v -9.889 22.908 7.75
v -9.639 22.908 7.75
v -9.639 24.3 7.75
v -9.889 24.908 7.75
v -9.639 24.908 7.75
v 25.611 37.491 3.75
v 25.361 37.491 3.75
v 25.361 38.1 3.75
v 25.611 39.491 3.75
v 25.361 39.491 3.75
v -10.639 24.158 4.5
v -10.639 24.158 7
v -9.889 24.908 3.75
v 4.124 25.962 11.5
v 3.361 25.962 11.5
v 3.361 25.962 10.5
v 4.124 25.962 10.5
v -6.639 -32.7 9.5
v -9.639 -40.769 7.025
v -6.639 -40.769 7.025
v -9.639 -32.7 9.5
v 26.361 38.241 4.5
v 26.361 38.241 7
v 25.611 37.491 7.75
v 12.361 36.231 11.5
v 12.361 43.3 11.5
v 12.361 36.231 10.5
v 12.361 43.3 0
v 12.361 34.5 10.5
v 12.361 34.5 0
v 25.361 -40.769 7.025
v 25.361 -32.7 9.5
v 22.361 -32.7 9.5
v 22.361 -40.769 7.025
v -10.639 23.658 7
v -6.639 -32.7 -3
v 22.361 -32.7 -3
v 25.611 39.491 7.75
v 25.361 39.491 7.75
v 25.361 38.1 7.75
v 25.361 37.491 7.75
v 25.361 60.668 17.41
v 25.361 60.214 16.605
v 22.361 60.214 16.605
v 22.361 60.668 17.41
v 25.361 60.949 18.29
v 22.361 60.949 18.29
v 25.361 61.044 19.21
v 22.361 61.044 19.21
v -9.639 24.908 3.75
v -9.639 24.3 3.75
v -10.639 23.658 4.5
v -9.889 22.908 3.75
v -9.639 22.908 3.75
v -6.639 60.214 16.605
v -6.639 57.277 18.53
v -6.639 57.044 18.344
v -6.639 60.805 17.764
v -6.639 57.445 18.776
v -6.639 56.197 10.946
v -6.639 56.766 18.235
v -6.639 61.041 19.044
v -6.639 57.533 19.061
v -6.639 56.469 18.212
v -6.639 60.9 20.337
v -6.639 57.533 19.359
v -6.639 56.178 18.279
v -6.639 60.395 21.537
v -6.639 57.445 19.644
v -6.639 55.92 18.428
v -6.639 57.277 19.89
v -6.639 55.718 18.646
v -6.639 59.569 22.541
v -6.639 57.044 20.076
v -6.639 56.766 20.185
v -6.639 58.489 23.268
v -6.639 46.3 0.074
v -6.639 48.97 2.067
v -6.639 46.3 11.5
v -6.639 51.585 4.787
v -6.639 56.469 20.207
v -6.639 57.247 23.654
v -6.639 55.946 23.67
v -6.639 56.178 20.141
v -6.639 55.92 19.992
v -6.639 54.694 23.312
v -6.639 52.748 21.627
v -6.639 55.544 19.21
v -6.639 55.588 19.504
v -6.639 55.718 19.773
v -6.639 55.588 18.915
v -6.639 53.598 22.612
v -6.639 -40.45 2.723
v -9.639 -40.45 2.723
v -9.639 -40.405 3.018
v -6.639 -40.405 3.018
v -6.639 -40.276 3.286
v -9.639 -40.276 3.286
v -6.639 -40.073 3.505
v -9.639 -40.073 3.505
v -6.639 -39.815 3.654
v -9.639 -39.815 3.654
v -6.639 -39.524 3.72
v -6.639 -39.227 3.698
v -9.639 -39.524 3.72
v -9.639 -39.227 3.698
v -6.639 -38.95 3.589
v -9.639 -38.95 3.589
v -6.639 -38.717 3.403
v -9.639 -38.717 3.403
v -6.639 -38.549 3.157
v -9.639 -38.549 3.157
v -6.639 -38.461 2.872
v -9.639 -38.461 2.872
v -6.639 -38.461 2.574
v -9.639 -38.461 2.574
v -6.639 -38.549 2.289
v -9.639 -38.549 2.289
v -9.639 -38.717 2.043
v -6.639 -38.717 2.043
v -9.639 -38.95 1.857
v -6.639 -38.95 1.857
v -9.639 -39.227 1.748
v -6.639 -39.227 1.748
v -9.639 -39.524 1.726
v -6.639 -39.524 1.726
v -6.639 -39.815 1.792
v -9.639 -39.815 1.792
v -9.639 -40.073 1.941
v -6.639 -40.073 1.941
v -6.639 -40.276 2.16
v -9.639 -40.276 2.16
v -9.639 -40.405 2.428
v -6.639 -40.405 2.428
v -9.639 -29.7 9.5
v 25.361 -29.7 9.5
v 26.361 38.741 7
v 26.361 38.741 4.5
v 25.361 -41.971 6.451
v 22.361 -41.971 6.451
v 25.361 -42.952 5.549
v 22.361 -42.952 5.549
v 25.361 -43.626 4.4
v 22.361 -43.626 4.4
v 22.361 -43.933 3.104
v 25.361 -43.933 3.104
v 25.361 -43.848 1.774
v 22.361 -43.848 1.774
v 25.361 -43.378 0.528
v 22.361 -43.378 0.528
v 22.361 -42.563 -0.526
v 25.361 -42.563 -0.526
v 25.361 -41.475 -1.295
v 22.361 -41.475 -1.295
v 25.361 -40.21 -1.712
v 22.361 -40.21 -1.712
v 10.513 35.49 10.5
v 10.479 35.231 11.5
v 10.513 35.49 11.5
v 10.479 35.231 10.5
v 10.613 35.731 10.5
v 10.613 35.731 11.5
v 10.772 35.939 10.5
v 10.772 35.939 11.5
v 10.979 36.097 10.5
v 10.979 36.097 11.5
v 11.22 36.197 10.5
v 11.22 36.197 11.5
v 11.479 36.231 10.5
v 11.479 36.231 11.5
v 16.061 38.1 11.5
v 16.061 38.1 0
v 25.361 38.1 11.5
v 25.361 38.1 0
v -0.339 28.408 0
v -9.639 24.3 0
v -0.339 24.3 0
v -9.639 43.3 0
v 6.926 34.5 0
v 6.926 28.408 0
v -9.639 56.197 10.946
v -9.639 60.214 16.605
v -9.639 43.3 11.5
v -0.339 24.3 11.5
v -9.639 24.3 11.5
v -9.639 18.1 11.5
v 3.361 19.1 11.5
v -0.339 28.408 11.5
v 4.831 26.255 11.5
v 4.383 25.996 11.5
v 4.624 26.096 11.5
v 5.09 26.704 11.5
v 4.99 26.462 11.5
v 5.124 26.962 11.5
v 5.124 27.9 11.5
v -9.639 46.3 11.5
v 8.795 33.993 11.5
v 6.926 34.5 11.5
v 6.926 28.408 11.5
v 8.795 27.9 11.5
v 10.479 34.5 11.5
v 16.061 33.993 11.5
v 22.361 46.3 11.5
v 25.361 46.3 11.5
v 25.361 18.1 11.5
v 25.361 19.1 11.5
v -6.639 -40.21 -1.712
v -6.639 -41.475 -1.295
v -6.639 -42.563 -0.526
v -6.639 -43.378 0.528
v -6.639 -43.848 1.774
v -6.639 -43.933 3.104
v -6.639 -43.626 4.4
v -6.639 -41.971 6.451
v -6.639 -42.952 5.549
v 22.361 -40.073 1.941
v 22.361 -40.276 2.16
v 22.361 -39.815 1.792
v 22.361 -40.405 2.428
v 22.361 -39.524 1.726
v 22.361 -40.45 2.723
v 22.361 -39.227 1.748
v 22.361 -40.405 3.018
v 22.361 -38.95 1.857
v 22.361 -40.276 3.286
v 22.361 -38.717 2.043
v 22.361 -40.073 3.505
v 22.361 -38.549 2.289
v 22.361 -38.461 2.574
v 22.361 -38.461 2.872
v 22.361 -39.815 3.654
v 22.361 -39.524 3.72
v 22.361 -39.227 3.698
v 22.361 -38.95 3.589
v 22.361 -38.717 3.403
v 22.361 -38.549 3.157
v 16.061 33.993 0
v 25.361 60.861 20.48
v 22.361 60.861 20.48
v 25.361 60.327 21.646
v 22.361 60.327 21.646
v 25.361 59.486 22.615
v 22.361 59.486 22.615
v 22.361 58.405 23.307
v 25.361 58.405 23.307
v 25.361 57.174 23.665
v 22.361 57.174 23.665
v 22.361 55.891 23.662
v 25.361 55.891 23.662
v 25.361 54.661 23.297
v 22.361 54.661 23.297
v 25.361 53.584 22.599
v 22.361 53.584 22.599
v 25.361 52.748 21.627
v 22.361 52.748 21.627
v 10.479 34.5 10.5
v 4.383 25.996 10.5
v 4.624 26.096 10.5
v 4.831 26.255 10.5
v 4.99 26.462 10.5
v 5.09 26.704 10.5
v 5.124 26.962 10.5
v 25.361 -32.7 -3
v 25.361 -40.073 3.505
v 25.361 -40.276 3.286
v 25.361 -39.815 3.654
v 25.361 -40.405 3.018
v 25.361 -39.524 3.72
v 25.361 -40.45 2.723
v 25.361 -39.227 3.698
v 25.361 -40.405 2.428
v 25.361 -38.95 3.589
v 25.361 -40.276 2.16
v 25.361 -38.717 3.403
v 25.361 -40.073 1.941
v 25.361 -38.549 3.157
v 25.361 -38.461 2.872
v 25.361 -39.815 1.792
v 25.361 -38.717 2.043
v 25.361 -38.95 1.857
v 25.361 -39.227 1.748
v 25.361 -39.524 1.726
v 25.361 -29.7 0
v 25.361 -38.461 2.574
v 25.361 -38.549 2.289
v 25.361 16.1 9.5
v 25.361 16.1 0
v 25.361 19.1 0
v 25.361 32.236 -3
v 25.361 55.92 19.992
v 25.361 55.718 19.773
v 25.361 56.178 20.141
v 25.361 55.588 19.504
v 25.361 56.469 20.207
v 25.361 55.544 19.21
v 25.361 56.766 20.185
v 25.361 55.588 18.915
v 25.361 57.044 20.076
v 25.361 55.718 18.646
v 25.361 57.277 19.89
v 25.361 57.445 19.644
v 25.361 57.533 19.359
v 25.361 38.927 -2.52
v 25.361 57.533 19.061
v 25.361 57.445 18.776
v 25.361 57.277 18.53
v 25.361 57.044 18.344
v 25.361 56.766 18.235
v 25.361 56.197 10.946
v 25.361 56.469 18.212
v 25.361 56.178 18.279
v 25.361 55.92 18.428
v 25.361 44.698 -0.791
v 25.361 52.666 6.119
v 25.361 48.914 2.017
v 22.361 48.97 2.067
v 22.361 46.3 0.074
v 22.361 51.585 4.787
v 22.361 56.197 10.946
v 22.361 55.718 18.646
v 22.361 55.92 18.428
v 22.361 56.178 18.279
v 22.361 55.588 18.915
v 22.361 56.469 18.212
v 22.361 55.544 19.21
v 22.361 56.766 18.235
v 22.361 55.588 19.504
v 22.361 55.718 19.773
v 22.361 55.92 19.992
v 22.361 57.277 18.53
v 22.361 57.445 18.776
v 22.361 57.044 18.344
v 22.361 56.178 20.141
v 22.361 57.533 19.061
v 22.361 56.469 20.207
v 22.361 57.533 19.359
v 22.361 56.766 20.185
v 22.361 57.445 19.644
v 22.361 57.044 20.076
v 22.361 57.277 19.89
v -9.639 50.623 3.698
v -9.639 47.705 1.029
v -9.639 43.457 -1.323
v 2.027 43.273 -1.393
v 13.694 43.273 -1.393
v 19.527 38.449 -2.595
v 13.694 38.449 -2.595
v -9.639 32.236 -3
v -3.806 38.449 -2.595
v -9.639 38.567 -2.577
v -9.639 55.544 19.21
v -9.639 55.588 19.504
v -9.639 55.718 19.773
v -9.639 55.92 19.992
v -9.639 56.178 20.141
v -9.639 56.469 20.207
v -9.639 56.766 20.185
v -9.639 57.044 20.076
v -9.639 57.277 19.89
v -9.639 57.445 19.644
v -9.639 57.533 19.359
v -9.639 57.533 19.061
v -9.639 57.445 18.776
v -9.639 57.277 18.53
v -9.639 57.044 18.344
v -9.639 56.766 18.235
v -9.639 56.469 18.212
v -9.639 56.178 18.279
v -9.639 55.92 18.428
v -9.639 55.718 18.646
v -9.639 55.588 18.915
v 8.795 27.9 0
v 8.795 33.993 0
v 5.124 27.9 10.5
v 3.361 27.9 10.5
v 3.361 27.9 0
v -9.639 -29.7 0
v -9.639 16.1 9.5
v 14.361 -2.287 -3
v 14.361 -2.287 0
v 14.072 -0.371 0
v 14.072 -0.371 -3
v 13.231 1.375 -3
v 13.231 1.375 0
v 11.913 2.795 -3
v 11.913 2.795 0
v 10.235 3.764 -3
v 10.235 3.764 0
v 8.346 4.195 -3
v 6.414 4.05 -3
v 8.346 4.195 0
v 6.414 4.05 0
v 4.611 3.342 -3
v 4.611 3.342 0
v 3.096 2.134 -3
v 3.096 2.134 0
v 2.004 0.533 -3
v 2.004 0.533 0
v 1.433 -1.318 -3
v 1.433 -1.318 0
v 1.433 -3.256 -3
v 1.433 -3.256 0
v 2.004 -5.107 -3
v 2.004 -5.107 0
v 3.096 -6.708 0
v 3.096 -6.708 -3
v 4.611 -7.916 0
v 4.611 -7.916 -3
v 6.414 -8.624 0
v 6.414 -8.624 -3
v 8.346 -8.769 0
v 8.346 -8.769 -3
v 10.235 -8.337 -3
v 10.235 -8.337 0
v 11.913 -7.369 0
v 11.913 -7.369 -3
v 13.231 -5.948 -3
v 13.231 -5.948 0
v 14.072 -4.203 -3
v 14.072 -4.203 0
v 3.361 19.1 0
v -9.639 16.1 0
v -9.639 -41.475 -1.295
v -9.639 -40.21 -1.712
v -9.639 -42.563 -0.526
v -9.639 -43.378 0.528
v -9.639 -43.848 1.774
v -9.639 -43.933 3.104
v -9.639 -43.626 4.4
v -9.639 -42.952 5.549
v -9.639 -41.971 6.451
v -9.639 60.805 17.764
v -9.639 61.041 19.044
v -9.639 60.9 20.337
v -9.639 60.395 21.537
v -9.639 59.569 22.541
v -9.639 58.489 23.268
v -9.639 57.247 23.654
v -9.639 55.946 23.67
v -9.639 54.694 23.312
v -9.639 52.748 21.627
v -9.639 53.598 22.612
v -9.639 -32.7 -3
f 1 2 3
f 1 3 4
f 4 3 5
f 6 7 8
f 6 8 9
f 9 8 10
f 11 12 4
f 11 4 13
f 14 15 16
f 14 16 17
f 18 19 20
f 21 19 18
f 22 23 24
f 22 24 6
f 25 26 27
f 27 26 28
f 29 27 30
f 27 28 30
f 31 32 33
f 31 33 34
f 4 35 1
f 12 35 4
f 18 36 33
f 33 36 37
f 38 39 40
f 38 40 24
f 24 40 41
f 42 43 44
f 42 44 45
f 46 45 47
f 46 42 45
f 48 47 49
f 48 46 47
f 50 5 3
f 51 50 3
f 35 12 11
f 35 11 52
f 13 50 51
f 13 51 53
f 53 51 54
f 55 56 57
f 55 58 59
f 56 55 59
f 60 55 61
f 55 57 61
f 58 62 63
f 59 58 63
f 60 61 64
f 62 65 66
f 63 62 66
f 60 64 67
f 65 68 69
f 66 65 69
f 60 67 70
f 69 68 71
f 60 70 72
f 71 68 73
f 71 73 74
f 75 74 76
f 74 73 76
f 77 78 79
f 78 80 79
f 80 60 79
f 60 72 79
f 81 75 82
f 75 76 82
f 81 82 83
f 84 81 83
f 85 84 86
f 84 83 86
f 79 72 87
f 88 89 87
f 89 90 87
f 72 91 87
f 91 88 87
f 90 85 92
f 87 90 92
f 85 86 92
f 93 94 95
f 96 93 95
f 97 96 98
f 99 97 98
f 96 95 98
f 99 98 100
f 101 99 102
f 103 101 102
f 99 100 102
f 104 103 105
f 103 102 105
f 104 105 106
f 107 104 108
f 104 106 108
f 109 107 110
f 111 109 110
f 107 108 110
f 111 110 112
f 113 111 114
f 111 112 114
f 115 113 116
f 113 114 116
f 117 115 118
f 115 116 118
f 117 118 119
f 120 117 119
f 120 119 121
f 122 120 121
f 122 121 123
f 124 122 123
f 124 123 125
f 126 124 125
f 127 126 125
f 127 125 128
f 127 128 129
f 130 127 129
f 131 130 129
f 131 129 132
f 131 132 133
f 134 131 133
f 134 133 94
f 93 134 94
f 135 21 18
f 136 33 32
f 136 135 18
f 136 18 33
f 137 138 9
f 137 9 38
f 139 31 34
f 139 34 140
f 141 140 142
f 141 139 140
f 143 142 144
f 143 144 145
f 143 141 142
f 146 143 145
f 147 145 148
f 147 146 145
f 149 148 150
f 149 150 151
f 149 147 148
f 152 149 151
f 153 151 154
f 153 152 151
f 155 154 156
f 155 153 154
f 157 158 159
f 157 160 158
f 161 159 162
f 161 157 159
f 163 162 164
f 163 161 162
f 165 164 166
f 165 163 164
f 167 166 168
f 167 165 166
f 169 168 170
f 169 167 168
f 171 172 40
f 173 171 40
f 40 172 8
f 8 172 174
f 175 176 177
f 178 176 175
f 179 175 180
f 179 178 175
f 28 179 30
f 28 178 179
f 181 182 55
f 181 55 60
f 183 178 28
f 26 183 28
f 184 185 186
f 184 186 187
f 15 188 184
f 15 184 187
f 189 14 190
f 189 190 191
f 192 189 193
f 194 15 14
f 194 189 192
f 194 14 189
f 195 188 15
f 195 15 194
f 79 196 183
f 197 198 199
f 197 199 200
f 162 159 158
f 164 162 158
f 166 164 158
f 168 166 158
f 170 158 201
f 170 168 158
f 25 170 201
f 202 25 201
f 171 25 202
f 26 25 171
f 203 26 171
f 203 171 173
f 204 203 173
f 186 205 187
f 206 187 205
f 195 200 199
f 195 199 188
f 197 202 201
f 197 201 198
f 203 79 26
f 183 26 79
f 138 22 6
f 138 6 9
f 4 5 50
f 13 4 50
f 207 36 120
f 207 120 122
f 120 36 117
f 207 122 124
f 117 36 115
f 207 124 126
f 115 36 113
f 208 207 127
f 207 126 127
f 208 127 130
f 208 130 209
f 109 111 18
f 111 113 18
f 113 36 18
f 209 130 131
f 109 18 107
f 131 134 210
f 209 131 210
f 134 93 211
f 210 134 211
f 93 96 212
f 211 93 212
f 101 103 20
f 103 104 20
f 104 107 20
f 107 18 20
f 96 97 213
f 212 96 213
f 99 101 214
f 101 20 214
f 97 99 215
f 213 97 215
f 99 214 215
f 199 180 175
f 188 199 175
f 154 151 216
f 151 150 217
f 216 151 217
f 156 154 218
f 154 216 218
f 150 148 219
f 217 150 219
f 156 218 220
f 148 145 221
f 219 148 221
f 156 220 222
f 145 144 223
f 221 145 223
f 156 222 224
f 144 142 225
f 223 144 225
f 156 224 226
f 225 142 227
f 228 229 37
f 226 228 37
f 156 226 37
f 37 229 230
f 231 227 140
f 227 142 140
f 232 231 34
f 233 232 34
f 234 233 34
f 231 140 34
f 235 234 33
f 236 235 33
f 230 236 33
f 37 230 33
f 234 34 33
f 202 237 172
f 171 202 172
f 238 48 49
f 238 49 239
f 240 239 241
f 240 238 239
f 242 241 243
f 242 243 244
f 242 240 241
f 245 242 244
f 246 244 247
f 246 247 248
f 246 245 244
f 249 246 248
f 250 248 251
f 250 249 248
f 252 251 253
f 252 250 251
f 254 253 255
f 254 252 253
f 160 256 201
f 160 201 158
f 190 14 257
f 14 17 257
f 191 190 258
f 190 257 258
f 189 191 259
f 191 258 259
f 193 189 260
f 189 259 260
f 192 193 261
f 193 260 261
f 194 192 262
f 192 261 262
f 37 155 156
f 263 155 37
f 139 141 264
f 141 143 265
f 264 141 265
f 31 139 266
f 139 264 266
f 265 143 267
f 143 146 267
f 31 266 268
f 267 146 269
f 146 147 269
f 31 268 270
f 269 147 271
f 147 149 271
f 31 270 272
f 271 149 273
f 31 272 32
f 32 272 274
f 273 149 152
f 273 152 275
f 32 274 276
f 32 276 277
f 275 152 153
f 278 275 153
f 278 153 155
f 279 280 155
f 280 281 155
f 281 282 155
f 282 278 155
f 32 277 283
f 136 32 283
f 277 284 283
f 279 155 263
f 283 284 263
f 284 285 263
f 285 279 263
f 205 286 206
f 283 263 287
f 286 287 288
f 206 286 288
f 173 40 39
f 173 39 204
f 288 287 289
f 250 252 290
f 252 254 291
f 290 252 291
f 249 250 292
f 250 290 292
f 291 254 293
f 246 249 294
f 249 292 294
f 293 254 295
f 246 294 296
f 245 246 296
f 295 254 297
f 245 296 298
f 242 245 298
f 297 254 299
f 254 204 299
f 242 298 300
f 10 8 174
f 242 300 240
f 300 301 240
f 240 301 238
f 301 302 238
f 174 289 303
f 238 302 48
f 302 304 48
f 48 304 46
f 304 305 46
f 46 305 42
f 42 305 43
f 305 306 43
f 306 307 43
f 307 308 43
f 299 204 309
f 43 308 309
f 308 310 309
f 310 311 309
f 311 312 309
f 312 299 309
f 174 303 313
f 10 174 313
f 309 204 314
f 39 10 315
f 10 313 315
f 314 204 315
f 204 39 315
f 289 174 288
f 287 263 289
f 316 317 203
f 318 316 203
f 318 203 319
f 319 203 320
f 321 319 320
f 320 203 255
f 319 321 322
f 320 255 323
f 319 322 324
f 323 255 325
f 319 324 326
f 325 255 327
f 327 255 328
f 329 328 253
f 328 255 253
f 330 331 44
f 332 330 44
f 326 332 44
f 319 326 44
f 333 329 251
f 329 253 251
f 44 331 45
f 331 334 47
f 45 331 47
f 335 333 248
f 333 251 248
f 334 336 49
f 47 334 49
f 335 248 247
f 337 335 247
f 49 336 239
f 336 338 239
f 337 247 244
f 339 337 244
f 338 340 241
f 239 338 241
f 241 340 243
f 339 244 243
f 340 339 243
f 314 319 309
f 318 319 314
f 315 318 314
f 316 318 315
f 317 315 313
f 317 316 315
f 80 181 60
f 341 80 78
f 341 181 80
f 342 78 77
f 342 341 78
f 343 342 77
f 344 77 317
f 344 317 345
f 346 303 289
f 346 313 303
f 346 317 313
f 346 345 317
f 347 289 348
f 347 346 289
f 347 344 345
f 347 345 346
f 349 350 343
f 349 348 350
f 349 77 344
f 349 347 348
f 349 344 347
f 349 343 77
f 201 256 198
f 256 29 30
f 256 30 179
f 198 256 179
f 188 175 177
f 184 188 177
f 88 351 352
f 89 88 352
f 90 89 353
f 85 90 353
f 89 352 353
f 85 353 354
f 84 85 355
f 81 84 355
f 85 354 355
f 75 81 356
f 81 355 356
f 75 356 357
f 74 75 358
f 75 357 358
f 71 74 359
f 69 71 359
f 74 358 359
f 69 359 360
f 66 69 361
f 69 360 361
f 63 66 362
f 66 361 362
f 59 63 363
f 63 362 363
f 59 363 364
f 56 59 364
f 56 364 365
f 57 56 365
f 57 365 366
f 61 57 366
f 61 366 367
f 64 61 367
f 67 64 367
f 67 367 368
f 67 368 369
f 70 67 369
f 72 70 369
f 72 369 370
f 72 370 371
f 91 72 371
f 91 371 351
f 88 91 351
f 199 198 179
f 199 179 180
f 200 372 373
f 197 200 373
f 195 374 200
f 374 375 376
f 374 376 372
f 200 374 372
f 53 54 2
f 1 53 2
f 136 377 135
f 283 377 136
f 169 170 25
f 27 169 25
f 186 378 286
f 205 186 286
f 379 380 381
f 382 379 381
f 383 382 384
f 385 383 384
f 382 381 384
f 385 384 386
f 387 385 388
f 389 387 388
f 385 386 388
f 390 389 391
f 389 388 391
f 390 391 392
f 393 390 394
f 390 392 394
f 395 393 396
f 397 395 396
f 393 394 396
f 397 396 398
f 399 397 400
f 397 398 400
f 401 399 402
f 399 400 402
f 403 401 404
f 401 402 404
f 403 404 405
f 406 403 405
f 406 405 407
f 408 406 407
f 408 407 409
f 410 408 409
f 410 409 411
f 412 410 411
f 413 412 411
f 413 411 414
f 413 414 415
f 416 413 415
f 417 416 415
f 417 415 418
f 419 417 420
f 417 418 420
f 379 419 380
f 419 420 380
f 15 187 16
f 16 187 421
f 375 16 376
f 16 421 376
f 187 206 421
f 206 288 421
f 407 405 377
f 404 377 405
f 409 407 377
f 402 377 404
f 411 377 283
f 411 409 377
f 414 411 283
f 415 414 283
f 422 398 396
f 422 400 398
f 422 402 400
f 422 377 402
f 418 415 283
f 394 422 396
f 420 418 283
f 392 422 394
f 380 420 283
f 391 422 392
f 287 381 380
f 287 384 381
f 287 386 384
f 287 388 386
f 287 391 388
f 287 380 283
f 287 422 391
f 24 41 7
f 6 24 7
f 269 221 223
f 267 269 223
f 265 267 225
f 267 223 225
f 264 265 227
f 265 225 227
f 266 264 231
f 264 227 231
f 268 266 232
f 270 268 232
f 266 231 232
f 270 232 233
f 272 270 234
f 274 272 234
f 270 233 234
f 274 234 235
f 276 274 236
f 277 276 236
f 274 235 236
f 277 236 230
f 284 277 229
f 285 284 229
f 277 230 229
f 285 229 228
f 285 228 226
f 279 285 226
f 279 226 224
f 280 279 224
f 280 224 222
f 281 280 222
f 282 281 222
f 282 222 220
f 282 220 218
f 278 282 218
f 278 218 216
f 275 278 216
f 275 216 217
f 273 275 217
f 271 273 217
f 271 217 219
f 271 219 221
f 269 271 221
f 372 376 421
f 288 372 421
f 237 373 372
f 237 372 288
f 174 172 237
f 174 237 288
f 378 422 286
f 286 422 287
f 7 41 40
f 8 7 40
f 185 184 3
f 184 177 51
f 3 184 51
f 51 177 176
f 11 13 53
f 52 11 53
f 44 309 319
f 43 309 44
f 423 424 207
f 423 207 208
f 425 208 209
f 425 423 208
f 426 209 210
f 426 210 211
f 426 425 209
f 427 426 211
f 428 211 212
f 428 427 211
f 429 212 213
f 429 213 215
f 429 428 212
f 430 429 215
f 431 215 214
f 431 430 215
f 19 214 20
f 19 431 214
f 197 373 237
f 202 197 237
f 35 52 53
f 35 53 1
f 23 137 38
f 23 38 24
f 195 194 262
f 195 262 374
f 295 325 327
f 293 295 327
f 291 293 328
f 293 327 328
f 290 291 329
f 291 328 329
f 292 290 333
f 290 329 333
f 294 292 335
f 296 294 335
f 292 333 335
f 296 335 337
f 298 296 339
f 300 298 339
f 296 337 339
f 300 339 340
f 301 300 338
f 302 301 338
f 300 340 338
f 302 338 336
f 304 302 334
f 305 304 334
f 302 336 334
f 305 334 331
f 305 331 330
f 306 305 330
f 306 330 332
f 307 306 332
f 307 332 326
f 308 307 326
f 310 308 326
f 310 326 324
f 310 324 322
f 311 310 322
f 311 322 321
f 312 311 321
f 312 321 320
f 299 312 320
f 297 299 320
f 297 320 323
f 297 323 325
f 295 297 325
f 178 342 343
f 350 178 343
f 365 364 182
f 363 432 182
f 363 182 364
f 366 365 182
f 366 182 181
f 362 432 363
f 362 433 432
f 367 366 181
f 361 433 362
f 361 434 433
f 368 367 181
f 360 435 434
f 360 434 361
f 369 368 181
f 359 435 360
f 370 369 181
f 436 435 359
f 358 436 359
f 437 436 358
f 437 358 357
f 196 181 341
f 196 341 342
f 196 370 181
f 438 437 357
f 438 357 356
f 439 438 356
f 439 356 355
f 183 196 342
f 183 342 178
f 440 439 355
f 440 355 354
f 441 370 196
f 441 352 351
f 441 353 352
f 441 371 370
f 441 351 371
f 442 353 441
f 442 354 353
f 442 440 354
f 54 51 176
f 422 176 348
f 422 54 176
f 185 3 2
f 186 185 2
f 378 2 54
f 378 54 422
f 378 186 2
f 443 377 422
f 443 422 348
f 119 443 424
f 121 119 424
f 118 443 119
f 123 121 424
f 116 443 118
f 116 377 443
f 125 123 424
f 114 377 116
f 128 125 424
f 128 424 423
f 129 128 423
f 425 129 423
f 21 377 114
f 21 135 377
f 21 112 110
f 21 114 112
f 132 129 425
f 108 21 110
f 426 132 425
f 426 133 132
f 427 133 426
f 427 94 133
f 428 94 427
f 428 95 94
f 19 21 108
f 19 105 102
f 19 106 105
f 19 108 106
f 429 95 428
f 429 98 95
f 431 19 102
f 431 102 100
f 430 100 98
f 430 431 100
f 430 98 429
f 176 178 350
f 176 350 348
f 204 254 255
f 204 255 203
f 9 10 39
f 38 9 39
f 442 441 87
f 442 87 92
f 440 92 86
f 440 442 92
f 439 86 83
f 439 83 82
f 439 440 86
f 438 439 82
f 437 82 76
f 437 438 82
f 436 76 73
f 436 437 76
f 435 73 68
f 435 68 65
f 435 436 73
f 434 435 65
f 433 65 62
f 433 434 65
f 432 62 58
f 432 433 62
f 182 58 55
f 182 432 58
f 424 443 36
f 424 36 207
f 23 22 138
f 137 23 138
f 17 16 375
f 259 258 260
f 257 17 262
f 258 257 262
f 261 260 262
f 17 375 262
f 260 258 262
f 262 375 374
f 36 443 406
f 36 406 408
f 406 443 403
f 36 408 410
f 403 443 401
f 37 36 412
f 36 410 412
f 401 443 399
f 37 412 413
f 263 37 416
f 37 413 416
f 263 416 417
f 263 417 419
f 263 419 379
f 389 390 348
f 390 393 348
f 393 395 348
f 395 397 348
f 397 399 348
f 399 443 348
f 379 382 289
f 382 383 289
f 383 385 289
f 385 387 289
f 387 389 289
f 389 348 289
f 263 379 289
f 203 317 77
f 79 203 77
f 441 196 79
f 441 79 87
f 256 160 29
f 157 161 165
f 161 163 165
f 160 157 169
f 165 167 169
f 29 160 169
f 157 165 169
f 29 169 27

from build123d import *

# Parameters (mm, degrees)
F0_R      = 6.5
F0_W      = 34.999999702
F0_H      = 3
F0_H_2    = 0.3
F1_DEPTH  = 3
F2_DEPTH  = 9.5
F3_DEPTH  = 11.5
F5_DEPTH  = 3
F7_DEPTH  = 3
F8_R      = 1
F9_DEPTH  = 35.000999702
F11_DEPTH = 1
F13_DEPTH = 1
F14_SIZE  = 0.75
F15_W     = 1.8819853365
F15_H     = 1.731043148
F15_W_2   = 1.7636035271
F15_H_2   = 1.938064149
F16_DEPTH = 1
F18_DEPTH = 36.000999702
F19_R     = 1
F20_SIZE2 = 2
F20_SIZE  = 2


# Not quite as in the source:
# - ends of sketch curves that miss each other by under 0.0002 mm in the source are joined
# - a feature names something its author has since deleted; it is built from what else it names


with BuildPart() as f1:
    # F0 (on Top) → F1 (new body)
    with BuildSketch(Plane.XY):
        Polygon((7.8607099131, 16.1003852367), (-9.6392899379, 16.1003852367), (-9.6392899379, -29.3996147633), (25.3607097641, -29.3996147633), (25.3607097641, 16.1003852367), align=None)
        with Locations((7.8607099131, -2.2867515218)):
            Circle(F0_R, mode=Mode.SUBTRACT)
        with Locations((7.8607099131, -31.1996147633)):
            Rectangle(F0_W, F0_H)
        Polygon((-9.6392899379, 19.1003852367), (-9.6392899379, 16.1003852367), (7.8607099131, 16.1003852367), (25.3607097641, 16.1003852367), (25.3607097641, 19.1003852367), (22.192974557, 19.1003852367), (3.3607097641, 19.1003852367), align=None)
        Polygon((-9.6392899379, 46.3003852367), (-9.6392899379, 43.3003852367), (-6.4715547308, 43.3003852367), (12.3607100621, 43.3003852367), (25.3607097641, 43.3003852367), (25.3607097641, 46.3003852367), align=None)
        with Locations((7.8607099131, -29.5496147633)):
            Rectangle(F0_W, F0_H_2)
        Polygon((16.0607097641, 38.1003852367), (25.3607097641, 38.1003852367), (25.3607097641, 43.3003852367), (12.3607100621, 43.3003852367), (12.3607100621, 35.3003852367), (12.3607100621, 34.5003852367), (7.8607097641, 34.5003852367), (7.8607100621, 33.9926332235), (8.7954637781, 33.9926332235), (16.0607097641, 33.9926332235), align=None)
        Polygon((-9.6392899379, 24.3003852367), (-9.6392899379, 19.1003852367), (3.3607097641, 19.1003852367), (3.3607097641, 27.1003852367), (3.3607097641, 27.9003852367), (7.8607100621, 27.9003852367), (7.8607100621, 28.4081372499), (6.9259563461, 28.4081372499), (-0.3392899379, 28.4081372499), (-0.3392899379, 24.3003852367), align=None)
        Polygon((6.9259563461, 34.5003852367), (6.9259563461, 28.4081372499), (7.8607097641, 28.4081372499), (7.8607100621, 33.9926332235), (7.8607100621, 34.5003852367), align=None)
        Polygon((7.8607100621, 28.4081372499), (7.8607100621, 27.9003852367), (8.7954637781, 27.9003852367), (8.7954637781, 33.9926332235), (7.8607097641, 33.9926332235), align=None)
        Polygon((-9.6392899379, 43.3003852367), (-9.6392899379, 24.3003852367), (-0.3392899379, 24.3003852367), (-0.3392899379, 28.4081372499), (6.9259563461, 28.4081372499), (6.9259563461, 34.5003852367), (7.8607100621, 34.5003852367), (12.3607100621, 34.5003852367), (12.3607100621, 35.3003852367), (12.3607100621, 43.3003852367), (-6.4715547308, 43.3003852367), align=None)
        Polygon((3.3607097641, 27.1003852367), (3.3607097641, 19.1003852367), (22.192974557, 19.1003852367), (25.3607097641, 19.1003852367), (25.3607097641, 38.1003852367), (16.0607097641, 38.1003852367), (16.0607097641, 33.9926332235), (8.7954637781, 33.9926332235), (8.7954637781, 27.9003852367), (7.8607100621, 27.9003852367), (3.3607097641, 27.9003852367), align=None)
    extrude(amount=-F1_DEPTH)

    # F0 (on Top) → F2 (join)
    with BuildSketch(Plane.XY):
        with Locations((7.8607099131, -31.1996147633)):
            Rectangle(F0_W, F0_H)
        Polygon((-9.6392899379, 19.1003852367), (-9.6392899379, 16.1003852367), (7.8607099131, 16.1003852367), (25.3607097641, 16.1003852367), (25.3607097641, 19.1003852367), (22.192974557, 19.1003852367), (3.3607097641, 19.1003852367), align=None)
    extrude(amount=F2_DEPTH)

    # F0 (on Top) → F3 (join)
    with BuildSketch(Plane.XY):
        Polygon((-9.6392899379, 46.3003852367), (-9.6392899379, 43.3003852367), (-6.4715547308, 43.3003852367), (12.3607100621, 43.3003852367), (25.3607097641, 43.3003852367), (25.3607097641, 46.3003852367), align=None)
        Polygon((-9.6392899379, 24.3003852367), (-9.6392899379, 19.1003852367), (3.3607097641, 19.1003852367), (3.3607097641, 27.1003852367), (3.3607097641, 27.9003852367), (7.8607100621, 27.9003852367), (7.8607100621, 28.4081372499), (6.9259563461, 28.4081372499), (-0.3392899379, 28.4081372499), (-0.3392899379, 24.3003852367), align=None)
        Polygon((7.8607100621, 28.4081372499), (7.8607100621, 27.9003852367), (8.7954637781, 27.9003852367), (8.7954637781, 33.9926332235), (7.8607097641, 33.9926332235), align=None)
        Polygon((6.9259563461, 34.5003852367), (6.9259563461, 28.4081372499), (7.8607097641, 28.4081372499), (7.8607100621, 33.9926332235), (7.8607100621, 34.5003852367), align=None)
        Polygon((16.0607097641, 38.1003852367), (25.3607097641, 38.1003852367), (25.3607097641, 43.3003852367), (12.3607100621, 43.3003852367), (12.3607100621, 35.3003852367), (12.3607100621, 34.5003852367), (7.8607097641, 34.5003852367), (7.8607100621, 33.9926332235), (8.7954637781, 33.9926332235), (16.0607097641, 33.9926332235), align=None)
        Polygon((-9.6392899379, 19.1003852367), (-9.6392899379, 16.1003852367), (7.8607099131, 16.1003852367), (25.3607097641, 16.1003852367), (25.3607097641, 19.1003852367), (22.192974557, 19.1003852367), (3.3607097641, 19.1003852367), align=None)
    extrude(amount=F3_DEPTH)

    # F4 (on face) → F5 (join)
    with BuildSketch(Plane.YZ.offset(25.3607097641)):
        Polygon((-32.6996147633, -3), (46.3003852367, -3), (46.3003852367, 11.5), (38.1003852367, 11.5), (38.1003852367, 0), (19.1003852367, 0), (19.1003852367, 11.5), (16.1003852367, 11.5), (16.1003852367, 0), (-29.6996147633, 0), (-29.6996147633, 9.5), (-32.6996147633, 9.5), align=None)
        with BuildLine():
            Line((46.3003852367, 11.5), (46.3003852367, -3))
            Line((46.3003852367, -3), (60.2135883006, 16.6053474951))
            ThreePointArc((60.2135883006, 16.6053474951), (54.0324103863, 15.4756413664), (52.7478740756, 21.6265082006))
            Line((52.7478740756, 21.6265082006), (46.3003852367, 11.5))
        make_face()
        with BuildLine():
            ThreePointArc((52.7478740756, 21.6265082006), (54.0324103863, 15.4756413664), (60.2135883006, 16.6053474951))
            ThreePointArc((60.2135883006, 16.6053474951), (60.8312132136, 17.8429507129), (61.0437823534, 19.2096754909))
            ThreePointArc((61.0437823534, 19.2096754909), (57.8024349564, 23.5300682537), (52.7478740756, 21.6265082006))
        make_face()
        with BuildLine():
            Line((-40.2101505455, -1.7121333681), (-32.6996147633, -3))
            Line((-32.6996147633, -3), (-32.6996147633, 9.5))
            Line((-32.6996147633, 9.5), (-40.7689799002, 7.0253734949))
            ThreePointArc((-40.7689799002, 7.0253734949), (-36.7744645914, 6.3416367755), (-34.9496147633, 2.7231327258))
            ThreePointArc((-34.9496147633, 2.7231327258), (-36.5489606146, -0.7172459612), (-40.2101505455, -1.7121333681))
        make_face()
        with BuildLine():
            ThreePointArc((-40.7689799002, 7.0253734949), (-43.9404391312, 2.4359106929), (-40.2101505455, -1.7121333681))
            ThreePointArc((-40.2101505455, -1.7121333681), (-36.5489606146, -0.7172459612), (-34.9496147633, 2.7231327258))
            ThreePointArc((-34.9496147633, 2.7231327258), (-36.7744645914, 6.3416367755), (-40.7689799002, 7.0253734949))
        make_face()
    extrude(amount=-F5_DEPTH)

    # F6 (on face) → F7 (join)
    with BuildSketch(Plane(origin=(-9.6392899379, 0, 0), x_dir=(0, -1, 0), z_dir=(-1, 0, 0))):
        with BuildLine():
            Line((-60.2135883006, 16.6053474951), (-46.3003852367, -3))
            Line((-46.3003852367, -3), (-46.3003852367, 11.5))
            Line((-46.3003852367, 11.5), (-52.7478740756, 21.6265082006))
            ThreePointArc((-52.7478740756, 21.6265082006), (-59.0551543205, 22.9437096154), (-60.2135883006, 16.6053474951))
        make_face()
        Polygon((-46.3003852367, 11.5), (-46.3003852367, -3), (32.6996147633, -3), (32.6996147633, 9.5), (29.6996147633, 9.5), (29.6996147633, 0), (-16.1003852367, 0), (-16.1003852367, 11.5), (-24.3003852367, 11.5), (-24.3003852367, 0), (-43.3003852367, 0), (-43.3003852367, 11.5), align=None)
        with BuildLine():
            Line((32.6996147633, 9.5), (32.6996147633, -3))
            Line((32.6996147633, -3), (40.2101505455, -1.7121333681))
            ThreePointArc((40.2101505455, -1.7121333681), (43.9404391312, 2.4359106929), (40.7689799002, 7.0253734949))
            Line((40.7689799002, 7.0253734949), (32.6996147633, 9.5))
        make_face()
    extrude(amount=-F7_DEPTH)

    # F8 (on face) → F9 (cut, through all)
    with BuildSketch(Plane(origin=(-9.6392899379, 0, 0), x_dir=(0, -1, 0), z_dir=(-1, 0, 0))):
        with Locations((-56.5437823534, 19.2096754909)):
            Circle(F8_R)
        with Locations((39.4496147633, 2.7231327258)):
            Circle(F8_R)
    extrude(amount=-F9_DEPTH, mode=Mode.SUBTRACT)

    # F10 (on face) → F11 (join)
    with BuildSketch(Plane.YZ.offset(25.3607097641)):
        Polygon((39.4906885922, 7.75), (38.1003852367, 7.75), (38.1003852367, 3.75), (39.4906885922, 3.75), (39.4906885922, 5.75), align=None)
        Polygon((38.1003852367, 3.75), (38.1003852367, 7.75), (37.4906885922, 7.75), (37.4906885922, 5.75), (37.4906885922, 3.75), align=None)
    extrude(amount=F11_DEPTH)

    # F12 (on face) → F13 (join)
    with BuildSketch(Plane(origin=(-9.6392899379, 0, 0), x_dir=(0, -1, 0), z_dir=(-1, 0, 0))):
        Polygon((-22.9083076119, 7.75), (-24.3003852367, 7.75), (-24.3003852367, 3.75), (-22.9083076119, 3.75), (-22.9083076119, 5.75), align=None)
        Polygon((-24.9083076119, 7.75), (-24.9083076119, 5.75), (-24.9083076119, 3.75), (-24.3003852367, 3.75), (-24.3003852367, 7.75), align=None)
    extrude(amount=F13_DEPTH)

    # F14
    f14_edges = [f1.edges().sort_by_distance(p)[0] for p in [
        (-10.63929, 24.908308, 5.75),
        (-10.63929, 22.908308, 5.75),
        (-10.63929, 23.908308, 7.75),
        (-10.63929, 23.908308, 3.75),
        (26.36071, 38.490689, 7.75),
        (26.36071, 37.490689, 5.75),
        (26.36071, 38.490689, 3.75),
        (26.36071, 39.490689, 5.75),
    ]]
    chamfer(f14_edges, length=F14_SIZE)

    # F15 (on face) → F16 (join)
    with BuildSketch(Plane.XY.offset(11.5)):
        with Locations((11.4197173938, 35.3659068108)):
            Rectangle(F15_W, F15_H)
        with Locations((4.2425115276, 26.9313531622)):
            Rectangle(F15_W_2, F15_H_2)
    extrude(amount=-F16_DEPTH)

    # F17 (on face) → F18 (cut, through all)
    with BuildSketch(Plane(origin=(-9.6392899379, 0, 0), x_dir=(0, -1, 0), z_dir=(-1, 0, 0))):
        with BuildLine():
            Line((-56.1974216606, 10.9460940352), (-46.3003852367, -3))
            Line((-46.3003852367, -3), (-32.2360508144, -3))
            add(Edge.make_bspline(
                [(-56.1974216606, 10.9460940352), (-49.7821666885, 1.9062415714), (-46.3003852367, -3), (-32.2360508144, -3)],
                knots=[0, 0, 0, 0, 27.7243725207, 27.7243725207, 27.7243725207, 27.7243725207], degree=3))
        make_face()
    extrude(amount=-F18_DEPTH, mode=Mode.SUBTRACT)

    # F19
    f19_edges = [f1.edges().sort_by_distance(p)[0] for p in [
        (5.124313, 25.962321, 11),
        (10.478725, 36.231428, 11),
    ]]
    fillet(f19_edges, radius=F19_R)

    # F20
    f20_edges = [f1.edges().sort_by_distance(p)[0] for p in [
        (7.86071, 16.100385, 11.5),
    ]]
    chamfer(f20_edges, length=F20_SIZE, length2=F20_SIZE2)


solid = f1.part
